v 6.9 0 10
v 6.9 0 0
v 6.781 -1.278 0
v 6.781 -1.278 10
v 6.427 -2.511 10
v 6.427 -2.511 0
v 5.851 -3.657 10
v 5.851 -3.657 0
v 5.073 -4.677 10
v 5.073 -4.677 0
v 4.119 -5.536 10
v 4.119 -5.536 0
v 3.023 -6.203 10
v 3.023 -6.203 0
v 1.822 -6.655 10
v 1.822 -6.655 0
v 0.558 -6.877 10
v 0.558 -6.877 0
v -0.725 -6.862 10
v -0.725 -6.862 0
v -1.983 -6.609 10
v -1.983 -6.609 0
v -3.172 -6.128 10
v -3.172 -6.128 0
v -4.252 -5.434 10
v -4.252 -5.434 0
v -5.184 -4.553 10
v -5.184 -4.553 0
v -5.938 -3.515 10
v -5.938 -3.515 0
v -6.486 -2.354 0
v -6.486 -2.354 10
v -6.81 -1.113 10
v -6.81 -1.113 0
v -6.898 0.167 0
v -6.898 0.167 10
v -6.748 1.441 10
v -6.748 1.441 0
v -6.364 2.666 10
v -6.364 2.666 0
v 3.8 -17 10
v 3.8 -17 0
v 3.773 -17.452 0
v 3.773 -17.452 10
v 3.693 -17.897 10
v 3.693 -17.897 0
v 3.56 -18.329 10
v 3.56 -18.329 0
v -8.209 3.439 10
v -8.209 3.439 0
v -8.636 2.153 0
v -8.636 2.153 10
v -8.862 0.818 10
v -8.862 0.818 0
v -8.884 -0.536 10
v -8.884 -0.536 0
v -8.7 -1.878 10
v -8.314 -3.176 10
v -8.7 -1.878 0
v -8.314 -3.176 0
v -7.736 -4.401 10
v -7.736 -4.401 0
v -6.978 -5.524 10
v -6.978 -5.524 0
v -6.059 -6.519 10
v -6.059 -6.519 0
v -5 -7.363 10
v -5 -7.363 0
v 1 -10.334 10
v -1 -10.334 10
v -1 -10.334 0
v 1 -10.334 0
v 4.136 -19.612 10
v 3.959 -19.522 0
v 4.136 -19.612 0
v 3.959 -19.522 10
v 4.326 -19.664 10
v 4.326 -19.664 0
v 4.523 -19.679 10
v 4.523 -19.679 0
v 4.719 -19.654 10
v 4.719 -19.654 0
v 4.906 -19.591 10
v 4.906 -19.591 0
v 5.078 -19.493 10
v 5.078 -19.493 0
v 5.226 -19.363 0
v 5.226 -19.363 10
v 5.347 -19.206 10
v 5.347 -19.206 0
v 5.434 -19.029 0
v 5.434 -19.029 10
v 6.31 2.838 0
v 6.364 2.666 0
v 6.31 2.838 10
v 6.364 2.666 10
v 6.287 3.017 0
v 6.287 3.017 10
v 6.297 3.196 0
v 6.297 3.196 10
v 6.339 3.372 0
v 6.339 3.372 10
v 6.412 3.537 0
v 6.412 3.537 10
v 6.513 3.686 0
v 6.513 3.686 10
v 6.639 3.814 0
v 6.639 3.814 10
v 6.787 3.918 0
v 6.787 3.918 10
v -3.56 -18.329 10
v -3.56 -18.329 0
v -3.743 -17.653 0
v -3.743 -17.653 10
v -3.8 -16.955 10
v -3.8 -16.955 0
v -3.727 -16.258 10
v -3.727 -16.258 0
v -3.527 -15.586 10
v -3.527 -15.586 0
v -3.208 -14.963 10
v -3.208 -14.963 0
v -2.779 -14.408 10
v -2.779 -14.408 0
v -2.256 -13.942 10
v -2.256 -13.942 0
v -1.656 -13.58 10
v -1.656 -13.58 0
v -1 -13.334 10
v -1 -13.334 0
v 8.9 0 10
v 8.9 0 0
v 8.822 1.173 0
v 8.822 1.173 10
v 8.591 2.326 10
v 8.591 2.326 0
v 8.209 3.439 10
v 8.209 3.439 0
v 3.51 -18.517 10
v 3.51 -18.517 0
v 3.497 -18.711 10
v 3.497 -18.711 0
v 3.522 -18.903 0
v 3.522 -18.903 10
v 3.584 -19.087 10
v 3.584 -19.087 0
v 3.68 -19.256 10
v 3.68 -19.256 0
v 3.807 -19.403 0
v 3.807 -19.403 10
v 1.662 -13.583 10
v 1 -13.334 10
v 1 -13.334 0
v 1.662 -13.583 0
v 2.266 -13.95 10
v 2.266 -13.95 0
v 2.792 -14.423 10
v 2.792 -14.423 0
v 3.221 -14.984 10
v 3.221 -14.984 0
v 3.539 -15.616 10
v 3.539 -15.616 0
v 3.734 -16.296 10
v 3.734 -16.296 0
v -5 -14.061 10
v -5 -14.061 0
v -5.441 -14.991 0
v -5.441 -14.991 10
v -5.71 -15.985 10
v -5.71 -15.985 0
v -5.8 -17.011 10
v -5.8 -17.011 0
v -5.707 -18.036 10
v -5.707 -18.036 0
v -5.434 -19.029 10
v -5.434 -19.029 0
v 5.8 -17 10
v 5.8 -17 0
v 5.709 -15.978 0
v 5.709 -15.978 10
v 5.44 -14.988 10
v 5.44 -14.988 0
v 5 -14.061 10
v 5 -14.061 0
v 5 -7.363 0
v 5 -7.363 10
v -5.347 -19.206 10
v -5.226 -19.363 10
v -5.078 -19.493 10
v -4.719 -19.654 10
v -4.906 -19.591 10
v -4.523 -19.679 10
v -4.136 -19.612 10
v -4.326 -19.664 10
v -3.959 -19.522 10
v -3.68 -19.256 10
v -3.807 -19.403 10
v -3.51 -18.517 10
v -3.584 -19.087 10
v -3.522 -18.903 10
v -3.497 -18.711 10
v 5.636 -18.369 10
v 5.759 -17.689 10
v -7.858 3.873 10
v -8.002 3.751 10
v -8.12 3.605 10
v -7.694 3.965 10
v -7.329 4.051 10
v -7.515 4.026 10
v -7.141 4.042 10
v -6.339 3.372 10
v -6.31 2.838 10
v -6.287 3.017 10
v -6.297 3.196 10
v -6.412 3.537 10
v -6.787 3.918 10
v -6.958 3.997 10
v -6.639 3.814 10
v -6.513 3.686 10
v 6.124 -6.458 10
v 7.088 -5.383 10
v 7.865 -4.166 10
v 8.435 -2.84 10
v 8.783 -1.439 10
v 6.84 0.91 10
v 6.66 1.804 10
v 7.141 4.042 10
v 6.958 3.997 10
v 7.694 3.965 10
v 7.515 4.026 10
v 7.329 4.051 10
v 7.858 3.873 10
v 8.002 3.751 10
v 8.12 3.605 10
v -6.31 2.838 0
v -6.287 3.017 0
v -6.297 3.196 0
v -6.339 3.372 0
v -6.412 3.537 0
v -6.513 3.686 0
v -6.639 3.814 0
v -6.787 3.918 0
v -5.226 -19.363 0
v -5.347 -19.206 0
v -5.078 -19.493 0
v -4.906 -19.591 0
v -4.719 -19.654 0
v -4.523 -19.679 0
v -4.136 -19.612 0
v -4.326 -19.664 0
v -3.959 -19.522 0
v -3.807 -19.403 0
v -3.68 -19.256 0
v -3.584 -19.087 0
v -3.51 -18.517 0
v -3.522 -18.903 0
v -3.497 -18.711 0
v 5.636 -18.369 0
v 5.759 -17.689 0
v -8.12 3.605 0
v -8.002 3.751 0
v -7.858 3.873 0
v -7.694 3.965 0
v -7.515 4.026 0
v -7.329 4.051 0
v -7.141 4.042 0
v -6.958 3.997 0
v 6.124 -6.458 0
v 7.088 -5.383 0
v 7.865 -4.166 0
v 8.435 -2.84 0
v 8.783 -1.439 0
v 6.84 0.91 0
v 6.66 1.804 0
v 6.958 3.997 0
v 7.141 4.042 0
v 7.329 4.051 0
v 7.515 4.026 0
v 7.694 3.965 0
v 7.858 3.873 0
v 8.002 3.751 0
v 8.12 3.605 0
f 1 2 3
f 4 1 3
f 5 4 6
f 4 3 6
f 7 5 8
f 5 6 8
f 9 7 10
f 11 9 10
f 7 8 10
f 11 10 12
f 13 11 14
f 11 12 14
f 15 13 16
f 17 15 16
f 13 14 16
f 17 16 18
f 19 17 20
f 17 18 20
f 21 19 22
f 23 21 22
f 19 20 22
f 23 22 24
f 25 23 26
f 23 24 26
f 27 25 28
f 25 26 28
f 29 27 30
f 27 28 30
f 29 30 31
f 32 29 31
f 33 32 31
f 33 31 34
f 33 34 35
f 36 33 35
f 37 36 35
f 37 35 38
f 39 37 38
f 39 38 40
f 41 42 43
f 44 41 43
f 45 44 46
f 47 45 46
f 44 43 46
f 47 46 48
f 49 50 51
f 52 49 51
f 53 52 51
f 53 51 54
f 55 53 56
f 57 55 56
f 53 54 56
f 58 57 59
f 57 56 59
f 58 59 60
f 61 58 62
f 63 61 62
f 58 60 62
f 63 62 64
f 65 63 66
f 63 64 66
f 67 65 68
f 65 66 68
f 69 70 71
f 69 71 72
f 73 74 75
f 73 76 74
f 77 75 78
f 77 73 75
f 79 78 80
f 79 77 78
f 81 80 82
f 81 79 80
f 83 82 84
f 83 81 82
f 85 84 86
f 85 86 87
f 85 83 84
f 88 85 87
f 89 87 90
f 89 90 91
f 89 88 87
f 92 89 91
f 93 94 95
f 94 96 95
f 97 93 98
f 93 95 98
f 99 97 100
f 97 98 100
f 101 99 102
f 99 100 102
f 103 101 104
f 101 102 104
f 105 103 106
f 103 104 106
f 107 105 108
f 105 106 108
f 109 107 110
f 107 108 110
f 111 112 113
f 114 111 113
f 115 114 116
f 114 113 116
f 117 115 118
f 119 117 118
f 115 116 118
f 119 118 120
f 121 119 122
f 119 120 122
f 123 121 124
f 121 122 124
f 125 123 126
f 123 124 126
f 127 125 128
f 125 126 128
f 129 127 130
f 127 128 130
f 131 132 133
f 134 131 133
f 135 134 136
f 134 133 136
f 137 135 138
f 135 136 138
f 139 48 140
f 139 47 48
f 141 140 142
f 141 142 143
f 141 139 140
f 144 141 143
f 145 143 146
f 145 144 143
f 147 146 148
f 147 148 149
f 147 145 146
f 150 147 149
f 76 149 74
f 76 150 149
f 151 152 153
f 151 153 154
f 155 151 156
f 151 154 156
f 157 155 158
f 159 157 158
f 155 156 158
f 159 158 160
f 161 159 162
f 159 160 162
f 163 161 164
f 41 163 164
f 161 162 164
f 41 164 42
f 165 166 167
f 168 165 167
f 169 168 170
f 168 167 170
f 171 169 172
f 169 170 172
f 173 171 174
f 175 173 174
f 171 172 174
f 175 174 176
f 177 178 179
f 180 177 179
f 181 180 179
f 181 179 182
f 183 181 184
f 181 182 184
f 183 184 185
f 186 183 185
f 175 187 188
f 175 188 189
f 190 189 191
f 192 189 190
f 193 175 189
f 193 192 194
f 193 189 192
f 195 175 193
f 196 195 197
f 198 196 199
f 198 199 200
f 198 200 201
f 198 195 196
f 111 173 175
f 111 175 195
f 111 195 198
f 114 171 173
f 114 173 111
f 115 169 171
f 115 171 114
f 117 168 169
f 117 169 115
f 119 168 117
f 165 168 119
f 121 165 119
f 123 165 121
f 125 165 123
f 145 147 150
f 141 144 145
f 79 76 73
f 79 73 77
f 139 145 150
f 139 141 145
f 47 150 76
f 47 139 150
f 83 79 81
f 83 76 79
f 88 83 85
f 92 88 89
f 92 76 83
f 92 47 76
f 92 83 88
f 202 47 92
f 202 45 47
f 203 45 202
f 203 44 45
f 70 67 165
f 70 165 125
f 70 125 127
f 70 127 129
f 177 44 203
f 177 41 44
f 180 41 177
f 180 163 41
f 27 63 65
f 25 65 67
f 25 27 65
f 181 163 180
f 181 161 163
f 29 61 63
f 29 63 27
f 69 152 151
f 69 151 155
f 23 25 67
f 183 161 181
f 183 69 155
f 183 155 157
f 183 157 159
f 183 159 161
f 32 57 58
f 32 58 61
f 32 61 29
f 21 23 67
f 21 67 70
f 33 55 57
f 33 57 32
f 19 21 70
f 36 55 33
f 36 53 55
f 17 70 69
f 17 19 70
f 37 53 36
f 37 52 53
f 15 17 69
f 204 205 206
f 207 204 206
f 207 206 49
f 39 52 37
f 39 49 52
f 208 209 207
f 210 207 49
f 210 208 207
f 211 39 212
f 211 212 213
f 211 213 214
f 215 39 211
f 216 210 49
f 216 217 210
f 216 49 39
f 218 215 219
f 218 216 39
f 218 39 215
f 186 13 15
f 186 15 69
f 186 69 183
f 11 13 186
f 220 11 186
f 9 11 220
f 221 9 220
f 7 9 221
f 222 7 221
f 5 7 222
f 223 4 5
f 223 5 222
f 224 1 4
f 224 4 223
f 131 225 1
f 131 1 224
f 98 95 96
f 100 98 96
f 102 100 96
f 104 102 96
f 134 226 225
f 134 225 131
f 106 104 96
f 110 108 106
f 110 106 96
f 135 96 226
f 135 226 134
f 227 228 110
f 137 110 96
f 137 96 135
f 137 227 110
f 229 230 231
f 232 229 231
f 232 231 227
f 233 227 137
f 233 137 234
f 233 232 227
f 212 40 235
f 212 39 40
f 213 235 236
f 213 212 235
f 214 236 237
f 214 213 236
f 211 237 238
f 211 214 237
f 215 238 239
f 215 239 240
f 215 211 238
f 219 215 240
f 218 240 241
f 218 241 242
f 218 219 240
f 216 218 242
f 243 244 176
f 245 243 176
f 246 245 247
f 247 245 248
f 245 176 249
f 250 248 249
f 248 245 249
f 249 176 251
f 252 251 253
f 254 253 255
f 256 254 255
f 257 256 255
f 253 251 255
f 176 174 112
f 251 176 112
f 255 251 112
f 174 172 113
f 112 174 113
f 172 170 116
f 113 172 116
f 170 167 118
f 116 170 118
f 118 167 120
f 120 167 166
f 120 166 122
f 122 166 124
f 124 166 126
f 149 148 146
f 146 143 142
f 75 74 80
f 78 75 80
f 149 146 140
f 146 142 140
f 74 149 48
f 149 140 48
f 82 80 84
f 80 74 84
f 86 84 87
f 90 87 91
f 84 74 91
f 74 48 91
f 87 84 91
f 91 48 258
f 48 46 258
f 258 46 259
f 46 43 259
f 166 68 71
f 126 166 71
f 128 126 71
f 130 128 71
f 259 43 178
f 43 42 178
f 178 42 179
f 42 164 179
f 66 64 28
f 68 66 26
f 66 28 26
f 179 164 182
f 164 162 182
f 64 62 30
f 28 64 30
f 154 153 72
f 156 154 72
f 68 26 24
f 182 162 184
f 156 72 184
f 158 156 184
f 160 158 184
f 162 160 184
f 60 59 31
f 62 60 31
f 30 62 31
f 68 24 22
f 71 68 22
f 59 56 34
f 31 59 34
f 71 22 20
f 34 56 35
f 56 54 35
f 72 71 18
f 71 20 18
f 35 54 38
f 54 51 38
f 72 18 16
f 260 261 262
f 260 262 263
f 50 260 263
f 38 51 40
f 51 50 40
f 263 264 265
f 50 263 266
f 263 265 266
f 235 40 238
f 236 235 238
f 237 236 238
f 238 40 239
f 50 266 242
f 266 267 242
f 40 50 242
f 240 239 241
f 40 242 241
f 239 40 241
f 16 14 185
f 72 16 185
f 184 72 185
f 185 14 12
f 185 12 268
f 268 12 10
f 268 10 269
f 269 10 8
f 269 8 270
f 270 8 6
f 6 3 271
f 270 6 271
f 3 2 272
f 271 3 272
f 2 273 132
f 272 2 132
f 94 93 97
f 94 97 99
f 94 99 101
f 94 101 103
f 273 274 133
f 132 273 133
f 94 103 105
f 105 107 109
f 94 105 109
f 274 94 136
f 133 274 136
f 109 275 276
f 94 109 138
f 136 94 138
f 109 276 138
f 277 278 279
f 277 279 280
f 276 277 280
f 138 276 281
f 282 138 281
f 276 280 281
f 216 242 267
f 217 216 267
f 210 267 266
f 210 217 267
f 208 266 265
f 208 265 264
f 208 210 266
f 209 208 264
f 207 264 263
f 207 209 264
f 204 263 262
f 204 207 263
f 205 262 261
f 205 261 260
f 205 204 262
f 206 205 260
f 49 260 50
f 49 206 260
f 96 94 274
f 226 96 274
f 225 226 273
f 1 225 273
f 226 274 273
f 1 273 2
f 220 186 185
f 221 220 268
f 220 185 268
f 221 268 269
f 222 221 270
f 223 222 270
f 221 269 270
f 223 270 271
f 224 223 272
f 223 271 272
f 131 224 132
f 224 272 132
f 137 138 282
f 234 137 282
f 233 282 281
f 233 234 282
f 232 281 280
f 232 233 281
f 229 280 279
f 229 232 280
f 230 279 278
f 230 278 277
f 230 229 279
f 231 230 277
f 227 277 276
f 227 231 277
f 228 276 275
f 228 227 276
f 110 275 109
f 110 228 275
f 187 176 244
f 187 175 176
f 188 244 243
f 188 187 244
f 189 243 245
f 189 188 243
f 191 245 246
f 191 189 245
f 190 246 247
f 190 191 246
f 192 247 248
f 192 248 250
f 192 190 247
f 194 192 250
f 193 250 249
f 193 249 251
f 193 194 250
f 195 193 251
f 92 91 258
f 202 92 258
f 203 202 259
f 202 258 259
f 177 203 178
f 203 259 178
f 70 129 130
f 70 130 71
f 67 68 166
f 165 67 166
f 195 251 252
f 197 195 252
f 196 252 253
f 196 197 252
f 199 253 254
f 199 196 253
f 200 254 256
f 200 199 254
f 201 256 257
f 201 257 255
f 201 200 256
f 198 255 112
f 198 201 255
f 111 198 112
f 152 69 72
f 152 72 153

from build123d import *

# Parameters (mm, degrees)
F1_DEPTH = 10
F2_R     = 0.99999


# Not quite as in the source:
# - a fillet or chamfer is up to 0.001 mm smaller than in the source, because OpenCascade refuses the exact size


with BuildPart() as f1:
    # F0 (on Top) → F1 (new body)
    with BuildSketch(Plane.XY):
        with BuildLine():
            ThreePointArc((5.9755752861, 3.45), (6.6648882014, 1.7858514112), (6.9, 0))
            ThreePointArc((6.9, 0), (-1.7858514112, -6.6648882014), (-5.9755752861, 3.45))
            Line((-5.9755752861, 3.45), (-7.7076260937, 4.45))
            ThreePointArc((-7.7076260937, 4.45), (-8.6750314555, -1.9884238095), (-5, -7.3627440537))
            ThreePointArc((-5, -7.3627440537), (0, -8.9), (5, -7.3627440537))
            ThreePointArc((5, -7.3627440537), (7.8647949751, -4.1659332688), (8.9, 0))
            ThreePointArc((8.9, 0), (8.596739854, 2.3034895014), (7.7076260937, 4.45))
            Line((7.7076260937, 4.45), (5.9755752861, 3.45))
        make_face()
        with BuildLine():
            ThreePointArc((5, -7.3627440537), (0, -8.9), (-5, -7.3627440537))
            Line((-5, -7.3627440537), (-5, -14.0606123087))
            ThreePointArc((-5, -14.0606123087), (-3.30506116, -12.233809621), (-1, -11.2868572572))
            Line((-1, -11.2868572572), (-1, -10.333939444))
            Line((-1, -10.333939444), (1, -10.333939444))
            Line((1, -10.333939444), (1, -11.2868572572))
            ThreePointArc((1, -11.2868572572), (3.30506116, -12.233809621), (5, -14.0606123087))
            Line((5, -14.0606123087), (5, -7.3627440537))
        make_face()
        with BuildLine():
            ThreePointArc((-1, -11.2868572572), (-3.30506116, -12.233809621), (-5, -14.0606123087))
            ThreePointArc((-5, -14.0606123087), (-5.7990721969, -17.1037383981), (-4.8916703857, -20.1163377284))
            Line((-4.8916703857, -20.1163377284), (-3.2048874941, -19.0417385117))
            ThreePointArc((-3.2048874941, -19.0417385117), (-3.5447161041, -15.6306980825), (-1, -13.333939444))
            Line((-1, -13.333939444), (-1, -11.2868572572))
        make_face()
        with BuildLine():
            ThreePointArc((5.8, -17), (5.5964274319, -15.4768453788), (5, -14.0606123087))
            ThreePointArc((5, -14.0606123087), (3.30506116, -12.233809621), (1, -11.2868572572))
            Line((1, -11.2868572572), (1, -13.333939444))
            ThreePointArc((1, -13.333939444), (3.0199337741, -14.6934874811), (3.8, -17))
            ThreePointArc((3.8, -17), (3.6481894467, -18.0633502533), (3.2048874941, -19.0417385117))
            Line((3.2048874941, -19.0417385117), (4.8916703857, -20.1163377284))
            ThreePointArc((4.8916703857, -20.1163377284), (5.5682891554, -18.6230082814), (5.8, -17))
        make_face()
    extrude(amount=F1_DEPTH)

    # F2 (radius 1 in the source; OpenCascade refuses exactly that, so slightly less here)
    f2_edges = [f1.edges().sort_by_distance(p)[0] for p in [
        (-7.707626, 4.45, 5),
        (-5.975575, 3.45, 5),
        (5.975575, 3.45, 5),
        (7.707626, 4.45, 5),
        (-4.89167, -20.116338, 5),
        (-3.204887, -19.041739, 5),
        (4.89167, -20.116338, 5),
        (3.204887, -19.041739, 5),
    ]]
    fillet(f2_edges, radius=F2_R)


solid = f1.part
